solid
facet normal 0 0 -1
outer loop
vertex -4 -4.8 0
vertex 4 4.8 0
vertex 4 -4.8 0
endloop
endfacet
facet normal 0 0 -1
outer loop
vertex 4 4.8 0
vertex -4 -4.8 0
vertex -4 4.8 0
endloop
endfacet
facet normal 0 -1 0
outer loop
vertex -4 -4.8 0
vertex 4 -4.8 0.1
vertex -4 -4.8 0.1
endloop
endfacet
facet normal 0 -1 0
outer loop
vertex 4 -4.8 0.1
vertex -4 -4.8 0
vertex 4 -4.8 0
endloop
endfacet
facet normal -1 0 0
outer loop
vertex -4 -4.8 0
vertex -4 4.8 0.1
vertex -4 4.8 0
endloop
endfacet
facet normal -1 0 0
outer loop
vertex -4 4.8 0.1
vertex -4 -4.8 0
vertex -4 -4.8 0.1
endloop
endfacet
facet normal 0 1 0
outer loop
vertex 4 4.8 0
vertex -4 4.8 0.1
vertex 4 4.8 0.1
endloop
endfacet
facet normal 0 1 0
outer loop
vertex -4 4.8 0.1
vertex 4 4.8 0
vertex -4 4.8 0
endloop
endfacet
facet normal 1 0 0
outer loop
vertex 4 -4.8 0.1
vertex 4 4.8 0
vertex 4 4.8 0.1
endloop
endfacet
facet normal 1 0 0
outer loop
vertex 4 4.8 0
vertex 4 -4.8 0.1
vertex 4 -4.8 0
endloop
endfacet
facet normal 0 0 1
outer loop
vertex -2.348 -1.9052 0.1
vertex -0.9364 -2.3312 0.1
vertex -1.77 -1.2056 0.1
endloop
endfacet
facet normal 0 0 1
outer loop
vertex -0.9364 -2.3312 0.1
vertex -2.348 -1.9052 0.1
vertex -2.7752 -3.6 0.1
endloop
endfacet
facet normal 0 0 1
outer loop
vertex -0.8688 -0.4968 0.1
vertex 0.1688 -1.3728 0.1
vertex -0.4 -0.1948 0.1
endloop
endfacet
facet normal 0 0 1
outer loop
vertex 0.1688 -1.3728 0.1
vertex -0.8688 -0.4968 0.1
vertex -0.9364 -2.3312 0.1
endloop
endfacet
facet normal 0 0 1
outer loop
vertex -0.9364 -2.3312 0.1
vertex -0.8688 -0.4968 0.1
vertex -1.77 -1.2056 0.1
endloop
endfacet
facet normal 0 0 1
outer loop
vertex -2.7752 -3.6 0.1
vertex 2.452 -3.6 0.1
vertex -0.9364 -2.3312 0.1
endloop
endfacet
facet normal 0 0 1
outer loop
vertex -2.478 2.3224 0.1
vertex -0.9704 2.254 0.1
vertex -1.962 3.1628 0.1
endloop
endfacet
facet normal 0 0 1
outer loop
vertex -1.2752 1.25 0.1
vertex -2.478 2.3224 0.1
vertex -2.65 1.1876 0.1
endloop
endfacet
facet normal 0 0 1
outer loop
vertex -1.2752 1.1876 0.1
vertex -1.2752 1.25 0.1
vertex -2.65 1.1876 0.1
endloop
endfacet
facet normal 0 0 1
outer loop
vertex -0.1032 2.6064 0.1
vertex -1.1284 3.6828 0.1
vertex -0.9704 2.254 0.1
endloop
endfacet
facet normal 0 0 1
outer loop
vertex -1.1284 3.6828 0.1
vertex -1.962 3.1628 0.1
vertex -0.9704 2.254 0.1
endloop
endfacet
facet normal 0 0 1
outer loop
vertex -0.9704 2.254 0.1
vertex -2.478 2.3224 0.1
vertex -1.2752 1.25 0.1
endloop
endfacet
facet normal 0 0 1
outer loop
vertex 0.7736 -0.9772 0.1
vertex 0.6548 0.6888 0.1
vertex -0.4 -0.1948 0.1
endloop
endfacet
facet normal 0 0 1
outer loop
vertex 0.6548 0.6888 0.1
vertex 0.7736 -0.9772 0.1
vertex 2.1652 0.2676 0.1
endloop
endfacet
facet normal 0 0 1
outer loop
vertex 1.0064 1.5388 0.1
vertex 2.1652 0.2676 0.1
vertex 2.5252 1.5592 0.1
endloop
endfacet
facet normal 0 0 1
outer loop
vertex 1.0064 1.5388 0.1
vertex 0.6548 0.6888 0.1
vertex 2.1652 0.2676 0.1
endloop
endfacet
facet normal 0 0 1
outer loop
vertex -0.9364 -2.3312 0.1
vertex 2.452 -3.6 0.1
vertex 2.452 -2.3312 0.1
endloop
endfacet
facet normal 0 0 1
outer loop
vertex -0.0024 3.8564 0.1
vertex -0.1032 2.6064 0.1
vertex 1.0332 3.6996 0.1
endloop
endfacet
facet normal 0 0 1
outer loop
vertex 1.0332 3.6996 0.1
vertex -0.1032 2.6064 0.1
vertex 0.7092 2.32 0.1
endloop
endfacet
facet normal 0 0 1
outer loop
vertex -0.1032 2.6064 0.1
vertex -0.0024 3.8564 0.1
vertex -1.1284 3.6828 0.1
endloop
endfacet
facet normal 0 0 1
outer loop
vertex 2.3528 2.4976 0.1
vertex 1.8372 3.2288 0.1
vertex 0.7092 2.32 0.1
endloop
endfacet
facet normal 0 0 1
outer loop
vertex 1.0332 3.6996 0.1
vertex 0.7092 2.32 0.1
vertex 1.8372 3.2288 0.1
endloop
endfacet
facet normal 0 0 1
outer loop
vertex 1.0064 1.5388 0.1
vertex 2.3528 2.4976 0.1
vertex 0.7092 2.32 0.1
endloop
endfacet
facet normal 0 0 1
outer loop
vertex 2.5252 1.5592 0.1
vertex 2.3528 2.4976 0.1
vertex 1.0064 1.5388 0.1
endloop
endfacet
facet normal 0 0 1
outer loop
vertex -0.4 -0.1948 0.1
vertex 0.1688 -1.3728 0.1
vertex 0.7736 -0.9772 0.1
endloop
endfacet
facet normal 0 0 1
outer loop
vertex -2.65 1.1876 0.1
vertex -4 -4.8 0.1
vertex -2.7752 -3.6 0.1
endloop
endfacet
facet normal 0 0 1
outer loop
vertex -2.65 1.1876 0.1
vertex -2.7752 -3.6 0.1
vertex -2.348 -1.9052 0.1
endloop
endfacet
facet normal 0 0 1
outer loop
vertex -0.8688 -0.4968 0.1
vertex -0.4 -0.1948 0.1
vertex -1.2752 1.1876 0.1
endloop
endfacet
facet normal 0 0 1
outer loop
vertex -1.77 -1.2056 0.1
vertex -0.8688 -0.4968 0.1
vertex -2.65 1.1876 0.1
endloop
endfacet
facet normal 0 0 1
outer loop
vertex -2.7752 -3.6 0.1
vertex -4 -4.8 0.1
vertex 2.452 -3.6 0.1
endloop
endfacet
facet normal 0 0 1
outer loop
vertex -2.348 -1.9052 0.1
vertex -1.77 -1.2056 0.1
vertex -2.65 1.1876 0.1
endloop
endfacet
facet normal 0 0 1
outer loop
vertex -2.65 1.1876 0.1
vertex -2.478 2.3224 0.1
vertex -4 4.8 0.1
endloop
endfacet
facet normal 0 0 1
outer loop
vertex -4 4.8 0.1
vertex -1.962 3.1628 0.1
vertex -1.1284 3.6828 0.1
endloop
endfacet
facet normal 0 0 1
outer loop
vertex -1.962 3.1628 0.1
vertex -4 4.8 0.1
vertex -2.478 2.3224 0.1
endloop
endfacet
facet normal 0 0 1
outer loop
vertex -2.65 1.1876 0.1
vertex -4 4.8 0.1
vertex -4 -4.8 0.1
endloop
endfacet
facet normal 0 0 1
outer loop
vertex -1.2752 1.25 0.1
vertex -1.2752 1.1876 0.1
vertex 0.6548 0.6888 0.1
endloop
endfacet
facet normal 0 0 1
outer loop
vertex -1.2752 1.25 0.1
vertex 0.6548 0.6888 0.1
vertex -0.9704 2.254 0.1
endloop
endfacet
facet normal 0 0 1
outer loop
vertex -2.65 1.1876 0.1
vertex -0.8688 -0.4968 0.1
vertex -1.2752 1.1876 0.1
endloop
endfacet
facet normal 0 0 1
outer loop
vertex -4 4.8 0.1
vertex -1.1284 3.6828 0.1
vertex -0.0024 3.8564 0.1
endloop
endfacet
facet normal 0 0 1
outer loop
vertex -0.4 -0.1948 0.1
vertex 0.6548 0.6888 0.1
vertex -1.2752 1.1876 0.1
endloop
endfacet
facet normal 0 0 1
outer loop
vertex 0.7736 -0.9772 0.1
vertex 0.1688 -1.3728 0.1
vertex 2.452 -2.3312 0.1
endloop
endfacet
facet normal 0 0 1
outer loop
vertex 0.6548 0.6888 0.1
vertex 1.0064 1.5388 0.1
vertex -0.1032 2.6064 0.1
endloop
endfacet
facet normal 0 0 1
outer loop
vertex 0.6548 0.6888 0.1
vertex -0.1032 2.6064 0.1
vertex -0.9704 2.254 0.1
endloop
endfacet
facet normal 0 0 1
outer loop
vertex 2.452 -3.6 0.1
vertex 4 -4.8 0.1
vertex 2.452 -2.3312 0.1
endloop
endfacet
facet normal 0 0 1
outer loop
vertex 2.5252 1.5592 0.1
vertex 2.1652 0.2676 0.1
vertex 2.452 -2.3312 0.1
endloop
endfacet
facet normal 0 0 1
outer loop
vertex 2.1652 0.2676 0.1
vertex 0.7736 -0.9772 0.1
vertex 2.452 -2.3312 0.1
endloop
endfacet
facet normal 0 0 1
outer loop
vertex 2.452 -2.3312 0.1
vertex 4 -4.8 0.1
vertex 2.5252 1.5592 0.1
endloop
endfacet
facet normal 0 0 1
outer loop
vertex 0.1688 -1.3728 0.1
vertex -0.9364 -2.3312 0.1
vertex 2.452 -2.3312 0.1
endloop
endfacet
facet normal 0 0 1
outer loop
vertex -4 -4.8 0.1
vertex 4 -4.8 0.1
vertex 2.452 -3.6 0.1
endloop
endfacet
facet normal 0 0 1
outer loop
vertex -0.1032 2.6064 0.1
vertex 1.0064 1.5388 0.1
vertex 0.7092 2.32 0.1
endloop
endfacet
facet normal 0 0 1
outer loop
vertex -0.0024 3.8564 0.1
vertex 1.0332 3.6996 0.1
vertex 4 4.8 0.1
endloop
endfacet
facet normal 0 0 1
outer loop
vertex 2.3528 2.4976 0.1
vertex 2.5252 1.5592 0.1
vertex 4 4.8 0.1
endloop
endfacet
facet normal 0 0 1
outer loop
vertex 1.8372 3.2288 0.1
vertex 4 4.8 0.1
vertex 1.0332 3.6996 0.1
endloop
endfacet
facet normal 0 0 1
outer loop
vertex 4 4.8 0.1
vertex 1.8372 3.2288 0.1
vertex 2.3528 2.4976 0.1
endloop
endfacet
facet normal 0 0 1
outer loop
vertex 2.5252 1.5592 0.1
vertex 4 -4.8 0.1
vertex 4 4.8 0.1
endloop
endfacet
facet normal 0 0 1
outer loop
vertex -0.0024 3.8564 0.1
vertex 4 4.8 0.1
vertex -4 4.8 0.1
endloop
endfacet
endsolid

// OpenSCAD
// file: ../p/box5-12.scad
use <../lib.scad>
function ldraw_lib__box5_12() = [
// 0 Box with 5 Faces without Any Edges
// 0 Name: box5-12.dat
// 0 Author: Chris Dee [cwdee]
// 0 !LDRAW_ORG Primitive UPDATE 2009-02
// 0 !LICENSE Licensed under CC BY 2.0 and CC BY 4.0 : see CAreadme.txt
// 
// 0 BFC CERTIFY CCW
  [0,"BFC","CERTIFY"],
  [0,"BFC","CCW"],
// 
// 0 !HISTORY 2009-09-03 [PTadmin] Official Update 2009-02
// 
// 
// 4 16 1 1 1 1 1 -1 -1 1 -1 -1 1 1
  [4,16,1,1,1,1,1,-1,-1,1,-1,-1,1,1],
// 4 16 -1 0 1 1 0 1 1 1 1 -1 1 1
  [4,16,-1,0,1,1,0,1,1,1,1,-1,1,1],
// 4 16 -1 0 -1 -1 0 1 -1 1 1 -1 1 -1
  [4,16,-1,0,-1,-1,0,1,-1,1,1,-1,1,-1],
// 4 16 1 0 -1 -1 0 -1 -1 1 -1 1 1 -1
  [4,16,1,0,-1,-1,0,-1,-1,1,-1,1,1,-1],
// 4 16 1 0 1 1 0 -1 1 1 -1 1 1 1
  [4,16,1,0,1,1,0,-1,1,1,-1,1,1,1],
// 0
];
makepoly(ldraw_lib__box5_12(), line=0.2);
// main file
use <../lib.scad>
use <../p/box5-12.scad>
function ldraw_lib__191915h() = [
// 0 Sticker  1.2 x  1 with Green "2"
// 0 Name: 191915h.dat
// 0 Author: Steffen [Steffen]
// 0 !LDRAW_ORG Part UPDATE 2012-01
// 0 !LICENSE Licensed under CC BY 2.0 and CC BY 4.0 : see CAreadme.txt
// 
// 0 BFC CERTIFY CCW
  [0,"BFC","CERTIFY"],
  [0,"BFC","CCW"],
// 
// 0 !KEYWORDS set 7740
// 
// 0 !HISTORY 2012-03-30 [PTadmin] Official Update 2012-01
// 
// 
// 1 16 0 -0.25 0 10 0 0 0 0.25 0 0 0 -12 box5-12.dat
  [1,16,0,-0.25,0,10,0,0,0,0.25,0,0,0,-12, ldraw_lib__box5_12()],
// 3 2 -5.87 -0.25 -4.763 -2.341 -0.25 -5.828 -4.425 -0.25 -3.014
  [3,2,-5.87,-0.25,-4.763,-2.341,-0.25,-5.828,-4.425,-0.25,-3.014],
// 3 2 -2.341 -0.25 -5.828 -5.87 -0.25 -4.763 -6.938 -0.25 -9
  [3,2,-2.341,-0.25,-5.828,-5.87,-0.25,-4.763,-6.938,-0.25,-9],
// 3 2 -2.172 -0.25 -1.242 0.422 -0.25 -3.432 -1 -0.25 -0.487
  [3,2,-2.172,-0.25,-1.242,0.422,-0.25,-3.432,-1,-0.25,-0.487],
// 3 2 0.422 -0.25 -3.432 -2.172 -0.25 -1.242 -2.341 -0.25 -5.828
  [3,2,0.422,-0.25,-3.432,-2.172,-0.25,-1.242,-2.341,-0.25,-5.828],
// 3 2 -2.341 -0.25 -5.828 -2.172 -0.25 -1.242 -4.425 -0.25 -3.014
  [3,2,-2.341,-0.25,-5.828,-2.172,-0.25,-1.242,-4.425,-0.25,-3.014],
// 3 2 -6.938 -0.25 -9 6.13 -0.25 -9 -2.341 -0.25 -5.828
  [3,2,-6.938,-0.25,-9,6.13,-0.25,-9,-2.341,-0.25,-5.828],
// 3 2 -6.195 -0.25 5.806 -2.426 -0.25 5.635 -4.905 -0.25 7.907
  [3,2,-6.195,-0.25,5.806,-2.426,-0.25,5.635,-4.905,-0.25,7.907],
// 3 2 -3.188 -0.25 3.125 -6.195 -0.25 5.806 -6.625 -0.25 2.969
  [3,2,-3.188,-0.25,3.125,-6.195,-0.25,5.806,-6.625,-0.25,2.969],
// 3 2 -3.188 -0.25 2.969 -3.188 -0.25 3.125 -6.625 -0.25 2.969
  [3,2,-3.188,-0.25,2.969,-3.188,-0.25,3.125,-6.625,-0.25,2.969],
// 3 2 -0.258 -0.25 6.516 -2.821 -0.25 9.207 -2.426 -0.25 5.635
  [3,2,-0.258,-0.25,6.516,-2.821,-0.25,9.207,-2.426,-0.25,5.635],
// 3 2 -2.821 -0.25 9.207 -4.905 -0.25 7.907 -2.426 -0.25 5.635
  [3,2,-2.821,-0.25,9.207,-4.905,-0.25,7.907,-2.426,-0.25,5.635],
// 3 2 -2.426 -0.25 5.635 -6.195 -0.25 5.806 -3.188 -0.25 3.125
  [3,2,-2.426,-0.25,5.635,-6.195,-0.25,5.806,-3.188,-0.25,3.125],
// 3 2 1.934 -0.25 -2.443 1.637 -0.25 1.722 -1 -0.25 -0.487
  [3,2,1.934,-0.25,-2.443,1.637,-0.25,1.722,-1,-0.25,-0.487],
// 3 2 1.637 -0.25 1.722 1.934 -0.25 -2.443 5.413 -0.25 0.669
  [3,2,1.637,-0.25,1.722,1.934,-0.25,-2.443,5.413,-0.25,0.669],
// 3 2 2.516 -0.25 3.847 5.413 -0.25 0.669 6.313 -0.25 3.898
  [3,2,2.516,-0.25,3.847,5.413,-0.25,0.669,6.313,-0.25,3.898],
// 3 2 2.516 -0.25 3.847 1.637 -0.25 1.722 5.413 -0.25 0.669
  [3,2,2.516,-0.25,3.847,1.637,-0.25,1.722,5.413,-0.25,0.669],
// 3 2 -2.341 -0.25 -5.828 6.13 -0.25 -9 6.13 -0.25 -5.828
  [3,2,-2.341,-0.25,-5.828,6.13,-0.25,-9,6.13,-0.25,-5.828],
// 3 2 -0.006 -0.25 9.641 -0.258 -0.25 6.516 2.583 -0.25 9.249
  [3,2,-0.006,-0.25,9.641,-0.258,-0.25,6.516,2.583,-0.25,9.249],
// 3 2 2.583 -0.25 9.249 -0.258 -0.25 6.516 1.773 -0.25 5.8
  [3,2,2.583,-0.25,9.249,-0.258,-0.25,6.516,1.773,-0.25,5.8],
// 3 2 -0.258 -0.25 6.516 -0.006 -0.25 9.641 -2.821 -0.25 9.207
  [3,2,-0.258,-0.25,6.516,-0.006,-0.25,9.641,-2.821,-0.25,9.207],
// 3 2 5.882 -0.25 6.244 4.593 -0.25 8.072 1.773 -0.25 5.8
  [3,2,5.882,-0.25,6.244,4.593,-0.25,8.072,1.773,-0.25,5.8],
// 3 2 2.583 -0.25 9.249 1.773 -0.25 5.8 4.593 -0.25 8.072
  [3,2,2.583,-0.25,9.249,1.773,-0.25,5.8,4.593,-0.25,8.072],
// 3 2 2.516 -0.25 3.847 5.882 -0.25 6.244 1.773 -0.25 5.8
  [3,2,2.516,-0.25,3.847,5.882,-0.25,6.244,1.773,-0.25,5.8],
// 3 2 6.313 -0.25 3.898 5.882 -0.25 6.244 2.516 -0.25 3.847
  [3,2,6.313,-0.25,3.898,5.882,-0.25,6.244,2.516,-0.25,3.847],
// 3 2 -1 -0.25 -0.487 0.422 -0.25 -3.432 1.934 -0.25 -2.443
  [3,2,-1,-0.25,-0.487,0.422,-0.25,-3.432,1.934,-0.25,-2.443],
// 3 16 -6.625 -0.25 2.969 -10 -0.25 -12 -6.938 -0.25 -9
  [3,16,-6.625,-0.25,2.969,-10,-0.25,-12,-6.938,-0.25,-9],
// 3 16 -6.625 -0.25 2.969 -6.938 -0.25 -9 -5.87 -0.25 -4.763
  [3,16,-6.625,-0.25,2.969,-6.938,-0.25,-9,-5.87,-0.25,-4.763],
// 3 16 -2.172 -0.25 -1.242 -1 -0.25 -0.487 -3.188 -0.25 2.969
  [3,16,-2.172,-0.25,-1.242,-1,-0.25,-0.487,-3.188,-0.25,2.969],
// 3 16 -4.425 -0.25 -3.014 -2.172 -0.25 -1.242 -6.625 -0.25 2.969
  [3,16,-4.425,-0.25,-3.014,-2.172,-0.25,-1.242,-6.625,-0.25,2.969],
// 3 16 -6.938 -0.25 -9 -10 -0.25 -12 6.13 -0.25 -9
  [3,16,-6.938,-0.25,-9,-10,-0.25,-12,6.13,-0.25,-9],
// 3 16 -5.87 -0.25 -4.763 -4.425 -0.25 -3.014 -6.625 -0.25 2.969
  [3,16,-5.87,-0.25,-4.763,-4.425,-0.25,-3.014,-6.625,-0.25,2.969],
// 3 16 -6.625 -0.25 2.969 -6.195 -0.25 5.806 -10 -0.25 12
  [3,16,-6.625,-0.25,2.969,-6.195,-0.25,5.806,-10,-0.25,12],
// 3 16 -10 -0.25 12 -4.905 -0.25 7.907 -2.821 -0.25 9.207
  [3,16,-10,-0.25,12,-4.905,-0.25,7.907,-2.821,-0.25,9.207],
// 3 16 -4.905 -0.25 7.907 -10 -0.25 12 -6.195 -0.25 5.806
  [3,16,-4.905,-0.25,7.907,-10,-0.25,12,-6.195,-0.25,5.806],
// 3 16 -6.625 -0.25 2.969 -10 -0.25 12 -10 -0.25 -12
  [3,16,-6.625,-0.25,2.969,-10,-0.25,12,-10,-0.25,-12],
// 3 16 -3.188 -0.25 3.125 -3.188 -0.25 2.969 1.637 -0.25 1.722
  [3,16,-3.188,-0.25,3.125,-3.188,-0.25,2.969,1.637,-0.25,1.722],
// 3 16 -3.188 -0.25 3.125 1.637 -0.25 1.722 -2.426 -0.25 5.635
  [3,16,-3.188,-0.25,3.125,1.637,-0.25,1.722,-2.426,-0.25,5.635],
// 3 16 -6.625 -0.25 2.969 -2.172 -0.25 -1.242 -3.188 -0.25 2.969
  [3,16,-6.625,-0.25,2.969,-2.172,-0.25,-1.242,-3.188,-0.25,2.969],
// 3 16 -10 -0.25 12 -2.821 -0.25 9.207 -0.006 -0.25 9.641
  [3,16,-10,-0.25,12,-2.821,-0.25,9.207,-0.006,-0.25,9.641],
// 3 16 -1 -0.25 -0.487 1.637 -0.25 1.722 -3.188 -0.25 2.969
  [3,16,-1,-0.25,-0.487,1.637,-0.25,1.722,-3.188,-0.25,2.969],
// 3 16 1.934 -0.25 -2.443 0.422 -0.25 -3.432 6.13 -0.25 -5.828
  [3,16,1.934,-0.25,-2.443,0.422,-0.25,-3.432,6.13,-0.25,-5.828],
// 3 16 1.637 -0.25 1.722 2.516 -0.25 3.847 -0.258 -0.25 6.516
  [3,16,1.637,-0.25,1.722,2.516,-0.25,3.847,-0.258,-0.25,6.516],
// 3 16 1.637 -0.25 1.722 -0.258 -0.25 6.516 -2.426 -0.25 5.635
  [3,16,1.637,-0.25,1.722,-0.258,-0.25,6.516,-2.426,-0.25,5.635],
// 3 16 6.13 -0.25 -9 10 -0.25 -12 6.13 -0.25 -5.828
  [3,16,6.13,-0.25,-9,10,-0.25,-12,6.13,-0.25,-5.828],
// 3 16 6.313 -0.25 3.898 5.413 -0.25 0.669 6.13 -0.25 -5.828
  [3,16,6.313,-0.25,3.898,5.413,-0.25,0.669,6.13,-0.25,-5.828],
// 3 16 5.413 -0.25 0.669 1.934 -0.25 -2.443 6.13 -0.25 -5.828
  [3,16,5.413,-0.25,0.669,1.934,-0.25,-2.443,6.13,-0.25,-5.828],
// 3 16 6.13 -0.25 -5.828 10 -0.25 -12 6.313 -0.25 3.898
  [3,16,6.13,-0.25,-5.828,10,-0.25,-12,6.313,-0.25,3.898],
// 3 16 0.422 -0.25 -3.432 -2.341 -0.25 -5.828 6.13 -0.25 -5.828
  [3,16,0.422,-0.25,-3.432,-2.341,-0.25,-5.828,6.13,-0.25,-5.828],
// 3 16 -10 -0.25 -12 10 -0.25 -12 6.13 -0.25 -9
  [3,16,-10,-0.25,-12,10,-0.25,-12,6.13,-0.25,-9],
// 3 16 -0.258 -0.25 6.516 2.516 -0.25 3.847 1.773 -0.25 5.8
  [3,16,-0.258,-0.25,6.516,2.516,-0.25,3.847,1.773,-0.25,5.8],
// 3 16 -0.006 -0.25 9.641 2.583 -0.25 9.249 10 -0.25 12
  [3,16,-0.006,-0.25,9.641,2.583,-0.25,9.249,10,-0.25,12],
// 3 16 5.882 -0.25 6.244 6.313 -0.25 3.898 10 -0.25 12
  [3,16,5.882,-0.25,6.244,6.313,-0.25,3.898,10,-0.25,12],
// 3 16 4.593 -0.25 8.072 10 -0.25 12 2.583 -0.25 9.249
  [3,16,4.593,-0.25,8.072,10,-0.25,12,2.583,-0.25,9.249],
// 3 16 10 -0.25 12 4.593 -0.25 8.072 5.882 -0.25 6.244
  [3,16,10,-0.25,12,4.593,-0.25,8.072,5.882,-0.25,6.244],
// 3 16 6.313 -0.25 3.898 10 -0.25 -12 10 -0.25 12
  [3,16,6.313,-0.25,3.898,10,-0.25,-12,10,-0.25,12],
// 3 16 -0.006 -0.25 9.641 10 -0.25 12 -10 -0.25 12
  [3,16,-0.006,-0.25,9.641,10,-0.25,12,-10,-0.25,12],
];
makepoly(ldraw_lib__191915h(), line=0.2);
